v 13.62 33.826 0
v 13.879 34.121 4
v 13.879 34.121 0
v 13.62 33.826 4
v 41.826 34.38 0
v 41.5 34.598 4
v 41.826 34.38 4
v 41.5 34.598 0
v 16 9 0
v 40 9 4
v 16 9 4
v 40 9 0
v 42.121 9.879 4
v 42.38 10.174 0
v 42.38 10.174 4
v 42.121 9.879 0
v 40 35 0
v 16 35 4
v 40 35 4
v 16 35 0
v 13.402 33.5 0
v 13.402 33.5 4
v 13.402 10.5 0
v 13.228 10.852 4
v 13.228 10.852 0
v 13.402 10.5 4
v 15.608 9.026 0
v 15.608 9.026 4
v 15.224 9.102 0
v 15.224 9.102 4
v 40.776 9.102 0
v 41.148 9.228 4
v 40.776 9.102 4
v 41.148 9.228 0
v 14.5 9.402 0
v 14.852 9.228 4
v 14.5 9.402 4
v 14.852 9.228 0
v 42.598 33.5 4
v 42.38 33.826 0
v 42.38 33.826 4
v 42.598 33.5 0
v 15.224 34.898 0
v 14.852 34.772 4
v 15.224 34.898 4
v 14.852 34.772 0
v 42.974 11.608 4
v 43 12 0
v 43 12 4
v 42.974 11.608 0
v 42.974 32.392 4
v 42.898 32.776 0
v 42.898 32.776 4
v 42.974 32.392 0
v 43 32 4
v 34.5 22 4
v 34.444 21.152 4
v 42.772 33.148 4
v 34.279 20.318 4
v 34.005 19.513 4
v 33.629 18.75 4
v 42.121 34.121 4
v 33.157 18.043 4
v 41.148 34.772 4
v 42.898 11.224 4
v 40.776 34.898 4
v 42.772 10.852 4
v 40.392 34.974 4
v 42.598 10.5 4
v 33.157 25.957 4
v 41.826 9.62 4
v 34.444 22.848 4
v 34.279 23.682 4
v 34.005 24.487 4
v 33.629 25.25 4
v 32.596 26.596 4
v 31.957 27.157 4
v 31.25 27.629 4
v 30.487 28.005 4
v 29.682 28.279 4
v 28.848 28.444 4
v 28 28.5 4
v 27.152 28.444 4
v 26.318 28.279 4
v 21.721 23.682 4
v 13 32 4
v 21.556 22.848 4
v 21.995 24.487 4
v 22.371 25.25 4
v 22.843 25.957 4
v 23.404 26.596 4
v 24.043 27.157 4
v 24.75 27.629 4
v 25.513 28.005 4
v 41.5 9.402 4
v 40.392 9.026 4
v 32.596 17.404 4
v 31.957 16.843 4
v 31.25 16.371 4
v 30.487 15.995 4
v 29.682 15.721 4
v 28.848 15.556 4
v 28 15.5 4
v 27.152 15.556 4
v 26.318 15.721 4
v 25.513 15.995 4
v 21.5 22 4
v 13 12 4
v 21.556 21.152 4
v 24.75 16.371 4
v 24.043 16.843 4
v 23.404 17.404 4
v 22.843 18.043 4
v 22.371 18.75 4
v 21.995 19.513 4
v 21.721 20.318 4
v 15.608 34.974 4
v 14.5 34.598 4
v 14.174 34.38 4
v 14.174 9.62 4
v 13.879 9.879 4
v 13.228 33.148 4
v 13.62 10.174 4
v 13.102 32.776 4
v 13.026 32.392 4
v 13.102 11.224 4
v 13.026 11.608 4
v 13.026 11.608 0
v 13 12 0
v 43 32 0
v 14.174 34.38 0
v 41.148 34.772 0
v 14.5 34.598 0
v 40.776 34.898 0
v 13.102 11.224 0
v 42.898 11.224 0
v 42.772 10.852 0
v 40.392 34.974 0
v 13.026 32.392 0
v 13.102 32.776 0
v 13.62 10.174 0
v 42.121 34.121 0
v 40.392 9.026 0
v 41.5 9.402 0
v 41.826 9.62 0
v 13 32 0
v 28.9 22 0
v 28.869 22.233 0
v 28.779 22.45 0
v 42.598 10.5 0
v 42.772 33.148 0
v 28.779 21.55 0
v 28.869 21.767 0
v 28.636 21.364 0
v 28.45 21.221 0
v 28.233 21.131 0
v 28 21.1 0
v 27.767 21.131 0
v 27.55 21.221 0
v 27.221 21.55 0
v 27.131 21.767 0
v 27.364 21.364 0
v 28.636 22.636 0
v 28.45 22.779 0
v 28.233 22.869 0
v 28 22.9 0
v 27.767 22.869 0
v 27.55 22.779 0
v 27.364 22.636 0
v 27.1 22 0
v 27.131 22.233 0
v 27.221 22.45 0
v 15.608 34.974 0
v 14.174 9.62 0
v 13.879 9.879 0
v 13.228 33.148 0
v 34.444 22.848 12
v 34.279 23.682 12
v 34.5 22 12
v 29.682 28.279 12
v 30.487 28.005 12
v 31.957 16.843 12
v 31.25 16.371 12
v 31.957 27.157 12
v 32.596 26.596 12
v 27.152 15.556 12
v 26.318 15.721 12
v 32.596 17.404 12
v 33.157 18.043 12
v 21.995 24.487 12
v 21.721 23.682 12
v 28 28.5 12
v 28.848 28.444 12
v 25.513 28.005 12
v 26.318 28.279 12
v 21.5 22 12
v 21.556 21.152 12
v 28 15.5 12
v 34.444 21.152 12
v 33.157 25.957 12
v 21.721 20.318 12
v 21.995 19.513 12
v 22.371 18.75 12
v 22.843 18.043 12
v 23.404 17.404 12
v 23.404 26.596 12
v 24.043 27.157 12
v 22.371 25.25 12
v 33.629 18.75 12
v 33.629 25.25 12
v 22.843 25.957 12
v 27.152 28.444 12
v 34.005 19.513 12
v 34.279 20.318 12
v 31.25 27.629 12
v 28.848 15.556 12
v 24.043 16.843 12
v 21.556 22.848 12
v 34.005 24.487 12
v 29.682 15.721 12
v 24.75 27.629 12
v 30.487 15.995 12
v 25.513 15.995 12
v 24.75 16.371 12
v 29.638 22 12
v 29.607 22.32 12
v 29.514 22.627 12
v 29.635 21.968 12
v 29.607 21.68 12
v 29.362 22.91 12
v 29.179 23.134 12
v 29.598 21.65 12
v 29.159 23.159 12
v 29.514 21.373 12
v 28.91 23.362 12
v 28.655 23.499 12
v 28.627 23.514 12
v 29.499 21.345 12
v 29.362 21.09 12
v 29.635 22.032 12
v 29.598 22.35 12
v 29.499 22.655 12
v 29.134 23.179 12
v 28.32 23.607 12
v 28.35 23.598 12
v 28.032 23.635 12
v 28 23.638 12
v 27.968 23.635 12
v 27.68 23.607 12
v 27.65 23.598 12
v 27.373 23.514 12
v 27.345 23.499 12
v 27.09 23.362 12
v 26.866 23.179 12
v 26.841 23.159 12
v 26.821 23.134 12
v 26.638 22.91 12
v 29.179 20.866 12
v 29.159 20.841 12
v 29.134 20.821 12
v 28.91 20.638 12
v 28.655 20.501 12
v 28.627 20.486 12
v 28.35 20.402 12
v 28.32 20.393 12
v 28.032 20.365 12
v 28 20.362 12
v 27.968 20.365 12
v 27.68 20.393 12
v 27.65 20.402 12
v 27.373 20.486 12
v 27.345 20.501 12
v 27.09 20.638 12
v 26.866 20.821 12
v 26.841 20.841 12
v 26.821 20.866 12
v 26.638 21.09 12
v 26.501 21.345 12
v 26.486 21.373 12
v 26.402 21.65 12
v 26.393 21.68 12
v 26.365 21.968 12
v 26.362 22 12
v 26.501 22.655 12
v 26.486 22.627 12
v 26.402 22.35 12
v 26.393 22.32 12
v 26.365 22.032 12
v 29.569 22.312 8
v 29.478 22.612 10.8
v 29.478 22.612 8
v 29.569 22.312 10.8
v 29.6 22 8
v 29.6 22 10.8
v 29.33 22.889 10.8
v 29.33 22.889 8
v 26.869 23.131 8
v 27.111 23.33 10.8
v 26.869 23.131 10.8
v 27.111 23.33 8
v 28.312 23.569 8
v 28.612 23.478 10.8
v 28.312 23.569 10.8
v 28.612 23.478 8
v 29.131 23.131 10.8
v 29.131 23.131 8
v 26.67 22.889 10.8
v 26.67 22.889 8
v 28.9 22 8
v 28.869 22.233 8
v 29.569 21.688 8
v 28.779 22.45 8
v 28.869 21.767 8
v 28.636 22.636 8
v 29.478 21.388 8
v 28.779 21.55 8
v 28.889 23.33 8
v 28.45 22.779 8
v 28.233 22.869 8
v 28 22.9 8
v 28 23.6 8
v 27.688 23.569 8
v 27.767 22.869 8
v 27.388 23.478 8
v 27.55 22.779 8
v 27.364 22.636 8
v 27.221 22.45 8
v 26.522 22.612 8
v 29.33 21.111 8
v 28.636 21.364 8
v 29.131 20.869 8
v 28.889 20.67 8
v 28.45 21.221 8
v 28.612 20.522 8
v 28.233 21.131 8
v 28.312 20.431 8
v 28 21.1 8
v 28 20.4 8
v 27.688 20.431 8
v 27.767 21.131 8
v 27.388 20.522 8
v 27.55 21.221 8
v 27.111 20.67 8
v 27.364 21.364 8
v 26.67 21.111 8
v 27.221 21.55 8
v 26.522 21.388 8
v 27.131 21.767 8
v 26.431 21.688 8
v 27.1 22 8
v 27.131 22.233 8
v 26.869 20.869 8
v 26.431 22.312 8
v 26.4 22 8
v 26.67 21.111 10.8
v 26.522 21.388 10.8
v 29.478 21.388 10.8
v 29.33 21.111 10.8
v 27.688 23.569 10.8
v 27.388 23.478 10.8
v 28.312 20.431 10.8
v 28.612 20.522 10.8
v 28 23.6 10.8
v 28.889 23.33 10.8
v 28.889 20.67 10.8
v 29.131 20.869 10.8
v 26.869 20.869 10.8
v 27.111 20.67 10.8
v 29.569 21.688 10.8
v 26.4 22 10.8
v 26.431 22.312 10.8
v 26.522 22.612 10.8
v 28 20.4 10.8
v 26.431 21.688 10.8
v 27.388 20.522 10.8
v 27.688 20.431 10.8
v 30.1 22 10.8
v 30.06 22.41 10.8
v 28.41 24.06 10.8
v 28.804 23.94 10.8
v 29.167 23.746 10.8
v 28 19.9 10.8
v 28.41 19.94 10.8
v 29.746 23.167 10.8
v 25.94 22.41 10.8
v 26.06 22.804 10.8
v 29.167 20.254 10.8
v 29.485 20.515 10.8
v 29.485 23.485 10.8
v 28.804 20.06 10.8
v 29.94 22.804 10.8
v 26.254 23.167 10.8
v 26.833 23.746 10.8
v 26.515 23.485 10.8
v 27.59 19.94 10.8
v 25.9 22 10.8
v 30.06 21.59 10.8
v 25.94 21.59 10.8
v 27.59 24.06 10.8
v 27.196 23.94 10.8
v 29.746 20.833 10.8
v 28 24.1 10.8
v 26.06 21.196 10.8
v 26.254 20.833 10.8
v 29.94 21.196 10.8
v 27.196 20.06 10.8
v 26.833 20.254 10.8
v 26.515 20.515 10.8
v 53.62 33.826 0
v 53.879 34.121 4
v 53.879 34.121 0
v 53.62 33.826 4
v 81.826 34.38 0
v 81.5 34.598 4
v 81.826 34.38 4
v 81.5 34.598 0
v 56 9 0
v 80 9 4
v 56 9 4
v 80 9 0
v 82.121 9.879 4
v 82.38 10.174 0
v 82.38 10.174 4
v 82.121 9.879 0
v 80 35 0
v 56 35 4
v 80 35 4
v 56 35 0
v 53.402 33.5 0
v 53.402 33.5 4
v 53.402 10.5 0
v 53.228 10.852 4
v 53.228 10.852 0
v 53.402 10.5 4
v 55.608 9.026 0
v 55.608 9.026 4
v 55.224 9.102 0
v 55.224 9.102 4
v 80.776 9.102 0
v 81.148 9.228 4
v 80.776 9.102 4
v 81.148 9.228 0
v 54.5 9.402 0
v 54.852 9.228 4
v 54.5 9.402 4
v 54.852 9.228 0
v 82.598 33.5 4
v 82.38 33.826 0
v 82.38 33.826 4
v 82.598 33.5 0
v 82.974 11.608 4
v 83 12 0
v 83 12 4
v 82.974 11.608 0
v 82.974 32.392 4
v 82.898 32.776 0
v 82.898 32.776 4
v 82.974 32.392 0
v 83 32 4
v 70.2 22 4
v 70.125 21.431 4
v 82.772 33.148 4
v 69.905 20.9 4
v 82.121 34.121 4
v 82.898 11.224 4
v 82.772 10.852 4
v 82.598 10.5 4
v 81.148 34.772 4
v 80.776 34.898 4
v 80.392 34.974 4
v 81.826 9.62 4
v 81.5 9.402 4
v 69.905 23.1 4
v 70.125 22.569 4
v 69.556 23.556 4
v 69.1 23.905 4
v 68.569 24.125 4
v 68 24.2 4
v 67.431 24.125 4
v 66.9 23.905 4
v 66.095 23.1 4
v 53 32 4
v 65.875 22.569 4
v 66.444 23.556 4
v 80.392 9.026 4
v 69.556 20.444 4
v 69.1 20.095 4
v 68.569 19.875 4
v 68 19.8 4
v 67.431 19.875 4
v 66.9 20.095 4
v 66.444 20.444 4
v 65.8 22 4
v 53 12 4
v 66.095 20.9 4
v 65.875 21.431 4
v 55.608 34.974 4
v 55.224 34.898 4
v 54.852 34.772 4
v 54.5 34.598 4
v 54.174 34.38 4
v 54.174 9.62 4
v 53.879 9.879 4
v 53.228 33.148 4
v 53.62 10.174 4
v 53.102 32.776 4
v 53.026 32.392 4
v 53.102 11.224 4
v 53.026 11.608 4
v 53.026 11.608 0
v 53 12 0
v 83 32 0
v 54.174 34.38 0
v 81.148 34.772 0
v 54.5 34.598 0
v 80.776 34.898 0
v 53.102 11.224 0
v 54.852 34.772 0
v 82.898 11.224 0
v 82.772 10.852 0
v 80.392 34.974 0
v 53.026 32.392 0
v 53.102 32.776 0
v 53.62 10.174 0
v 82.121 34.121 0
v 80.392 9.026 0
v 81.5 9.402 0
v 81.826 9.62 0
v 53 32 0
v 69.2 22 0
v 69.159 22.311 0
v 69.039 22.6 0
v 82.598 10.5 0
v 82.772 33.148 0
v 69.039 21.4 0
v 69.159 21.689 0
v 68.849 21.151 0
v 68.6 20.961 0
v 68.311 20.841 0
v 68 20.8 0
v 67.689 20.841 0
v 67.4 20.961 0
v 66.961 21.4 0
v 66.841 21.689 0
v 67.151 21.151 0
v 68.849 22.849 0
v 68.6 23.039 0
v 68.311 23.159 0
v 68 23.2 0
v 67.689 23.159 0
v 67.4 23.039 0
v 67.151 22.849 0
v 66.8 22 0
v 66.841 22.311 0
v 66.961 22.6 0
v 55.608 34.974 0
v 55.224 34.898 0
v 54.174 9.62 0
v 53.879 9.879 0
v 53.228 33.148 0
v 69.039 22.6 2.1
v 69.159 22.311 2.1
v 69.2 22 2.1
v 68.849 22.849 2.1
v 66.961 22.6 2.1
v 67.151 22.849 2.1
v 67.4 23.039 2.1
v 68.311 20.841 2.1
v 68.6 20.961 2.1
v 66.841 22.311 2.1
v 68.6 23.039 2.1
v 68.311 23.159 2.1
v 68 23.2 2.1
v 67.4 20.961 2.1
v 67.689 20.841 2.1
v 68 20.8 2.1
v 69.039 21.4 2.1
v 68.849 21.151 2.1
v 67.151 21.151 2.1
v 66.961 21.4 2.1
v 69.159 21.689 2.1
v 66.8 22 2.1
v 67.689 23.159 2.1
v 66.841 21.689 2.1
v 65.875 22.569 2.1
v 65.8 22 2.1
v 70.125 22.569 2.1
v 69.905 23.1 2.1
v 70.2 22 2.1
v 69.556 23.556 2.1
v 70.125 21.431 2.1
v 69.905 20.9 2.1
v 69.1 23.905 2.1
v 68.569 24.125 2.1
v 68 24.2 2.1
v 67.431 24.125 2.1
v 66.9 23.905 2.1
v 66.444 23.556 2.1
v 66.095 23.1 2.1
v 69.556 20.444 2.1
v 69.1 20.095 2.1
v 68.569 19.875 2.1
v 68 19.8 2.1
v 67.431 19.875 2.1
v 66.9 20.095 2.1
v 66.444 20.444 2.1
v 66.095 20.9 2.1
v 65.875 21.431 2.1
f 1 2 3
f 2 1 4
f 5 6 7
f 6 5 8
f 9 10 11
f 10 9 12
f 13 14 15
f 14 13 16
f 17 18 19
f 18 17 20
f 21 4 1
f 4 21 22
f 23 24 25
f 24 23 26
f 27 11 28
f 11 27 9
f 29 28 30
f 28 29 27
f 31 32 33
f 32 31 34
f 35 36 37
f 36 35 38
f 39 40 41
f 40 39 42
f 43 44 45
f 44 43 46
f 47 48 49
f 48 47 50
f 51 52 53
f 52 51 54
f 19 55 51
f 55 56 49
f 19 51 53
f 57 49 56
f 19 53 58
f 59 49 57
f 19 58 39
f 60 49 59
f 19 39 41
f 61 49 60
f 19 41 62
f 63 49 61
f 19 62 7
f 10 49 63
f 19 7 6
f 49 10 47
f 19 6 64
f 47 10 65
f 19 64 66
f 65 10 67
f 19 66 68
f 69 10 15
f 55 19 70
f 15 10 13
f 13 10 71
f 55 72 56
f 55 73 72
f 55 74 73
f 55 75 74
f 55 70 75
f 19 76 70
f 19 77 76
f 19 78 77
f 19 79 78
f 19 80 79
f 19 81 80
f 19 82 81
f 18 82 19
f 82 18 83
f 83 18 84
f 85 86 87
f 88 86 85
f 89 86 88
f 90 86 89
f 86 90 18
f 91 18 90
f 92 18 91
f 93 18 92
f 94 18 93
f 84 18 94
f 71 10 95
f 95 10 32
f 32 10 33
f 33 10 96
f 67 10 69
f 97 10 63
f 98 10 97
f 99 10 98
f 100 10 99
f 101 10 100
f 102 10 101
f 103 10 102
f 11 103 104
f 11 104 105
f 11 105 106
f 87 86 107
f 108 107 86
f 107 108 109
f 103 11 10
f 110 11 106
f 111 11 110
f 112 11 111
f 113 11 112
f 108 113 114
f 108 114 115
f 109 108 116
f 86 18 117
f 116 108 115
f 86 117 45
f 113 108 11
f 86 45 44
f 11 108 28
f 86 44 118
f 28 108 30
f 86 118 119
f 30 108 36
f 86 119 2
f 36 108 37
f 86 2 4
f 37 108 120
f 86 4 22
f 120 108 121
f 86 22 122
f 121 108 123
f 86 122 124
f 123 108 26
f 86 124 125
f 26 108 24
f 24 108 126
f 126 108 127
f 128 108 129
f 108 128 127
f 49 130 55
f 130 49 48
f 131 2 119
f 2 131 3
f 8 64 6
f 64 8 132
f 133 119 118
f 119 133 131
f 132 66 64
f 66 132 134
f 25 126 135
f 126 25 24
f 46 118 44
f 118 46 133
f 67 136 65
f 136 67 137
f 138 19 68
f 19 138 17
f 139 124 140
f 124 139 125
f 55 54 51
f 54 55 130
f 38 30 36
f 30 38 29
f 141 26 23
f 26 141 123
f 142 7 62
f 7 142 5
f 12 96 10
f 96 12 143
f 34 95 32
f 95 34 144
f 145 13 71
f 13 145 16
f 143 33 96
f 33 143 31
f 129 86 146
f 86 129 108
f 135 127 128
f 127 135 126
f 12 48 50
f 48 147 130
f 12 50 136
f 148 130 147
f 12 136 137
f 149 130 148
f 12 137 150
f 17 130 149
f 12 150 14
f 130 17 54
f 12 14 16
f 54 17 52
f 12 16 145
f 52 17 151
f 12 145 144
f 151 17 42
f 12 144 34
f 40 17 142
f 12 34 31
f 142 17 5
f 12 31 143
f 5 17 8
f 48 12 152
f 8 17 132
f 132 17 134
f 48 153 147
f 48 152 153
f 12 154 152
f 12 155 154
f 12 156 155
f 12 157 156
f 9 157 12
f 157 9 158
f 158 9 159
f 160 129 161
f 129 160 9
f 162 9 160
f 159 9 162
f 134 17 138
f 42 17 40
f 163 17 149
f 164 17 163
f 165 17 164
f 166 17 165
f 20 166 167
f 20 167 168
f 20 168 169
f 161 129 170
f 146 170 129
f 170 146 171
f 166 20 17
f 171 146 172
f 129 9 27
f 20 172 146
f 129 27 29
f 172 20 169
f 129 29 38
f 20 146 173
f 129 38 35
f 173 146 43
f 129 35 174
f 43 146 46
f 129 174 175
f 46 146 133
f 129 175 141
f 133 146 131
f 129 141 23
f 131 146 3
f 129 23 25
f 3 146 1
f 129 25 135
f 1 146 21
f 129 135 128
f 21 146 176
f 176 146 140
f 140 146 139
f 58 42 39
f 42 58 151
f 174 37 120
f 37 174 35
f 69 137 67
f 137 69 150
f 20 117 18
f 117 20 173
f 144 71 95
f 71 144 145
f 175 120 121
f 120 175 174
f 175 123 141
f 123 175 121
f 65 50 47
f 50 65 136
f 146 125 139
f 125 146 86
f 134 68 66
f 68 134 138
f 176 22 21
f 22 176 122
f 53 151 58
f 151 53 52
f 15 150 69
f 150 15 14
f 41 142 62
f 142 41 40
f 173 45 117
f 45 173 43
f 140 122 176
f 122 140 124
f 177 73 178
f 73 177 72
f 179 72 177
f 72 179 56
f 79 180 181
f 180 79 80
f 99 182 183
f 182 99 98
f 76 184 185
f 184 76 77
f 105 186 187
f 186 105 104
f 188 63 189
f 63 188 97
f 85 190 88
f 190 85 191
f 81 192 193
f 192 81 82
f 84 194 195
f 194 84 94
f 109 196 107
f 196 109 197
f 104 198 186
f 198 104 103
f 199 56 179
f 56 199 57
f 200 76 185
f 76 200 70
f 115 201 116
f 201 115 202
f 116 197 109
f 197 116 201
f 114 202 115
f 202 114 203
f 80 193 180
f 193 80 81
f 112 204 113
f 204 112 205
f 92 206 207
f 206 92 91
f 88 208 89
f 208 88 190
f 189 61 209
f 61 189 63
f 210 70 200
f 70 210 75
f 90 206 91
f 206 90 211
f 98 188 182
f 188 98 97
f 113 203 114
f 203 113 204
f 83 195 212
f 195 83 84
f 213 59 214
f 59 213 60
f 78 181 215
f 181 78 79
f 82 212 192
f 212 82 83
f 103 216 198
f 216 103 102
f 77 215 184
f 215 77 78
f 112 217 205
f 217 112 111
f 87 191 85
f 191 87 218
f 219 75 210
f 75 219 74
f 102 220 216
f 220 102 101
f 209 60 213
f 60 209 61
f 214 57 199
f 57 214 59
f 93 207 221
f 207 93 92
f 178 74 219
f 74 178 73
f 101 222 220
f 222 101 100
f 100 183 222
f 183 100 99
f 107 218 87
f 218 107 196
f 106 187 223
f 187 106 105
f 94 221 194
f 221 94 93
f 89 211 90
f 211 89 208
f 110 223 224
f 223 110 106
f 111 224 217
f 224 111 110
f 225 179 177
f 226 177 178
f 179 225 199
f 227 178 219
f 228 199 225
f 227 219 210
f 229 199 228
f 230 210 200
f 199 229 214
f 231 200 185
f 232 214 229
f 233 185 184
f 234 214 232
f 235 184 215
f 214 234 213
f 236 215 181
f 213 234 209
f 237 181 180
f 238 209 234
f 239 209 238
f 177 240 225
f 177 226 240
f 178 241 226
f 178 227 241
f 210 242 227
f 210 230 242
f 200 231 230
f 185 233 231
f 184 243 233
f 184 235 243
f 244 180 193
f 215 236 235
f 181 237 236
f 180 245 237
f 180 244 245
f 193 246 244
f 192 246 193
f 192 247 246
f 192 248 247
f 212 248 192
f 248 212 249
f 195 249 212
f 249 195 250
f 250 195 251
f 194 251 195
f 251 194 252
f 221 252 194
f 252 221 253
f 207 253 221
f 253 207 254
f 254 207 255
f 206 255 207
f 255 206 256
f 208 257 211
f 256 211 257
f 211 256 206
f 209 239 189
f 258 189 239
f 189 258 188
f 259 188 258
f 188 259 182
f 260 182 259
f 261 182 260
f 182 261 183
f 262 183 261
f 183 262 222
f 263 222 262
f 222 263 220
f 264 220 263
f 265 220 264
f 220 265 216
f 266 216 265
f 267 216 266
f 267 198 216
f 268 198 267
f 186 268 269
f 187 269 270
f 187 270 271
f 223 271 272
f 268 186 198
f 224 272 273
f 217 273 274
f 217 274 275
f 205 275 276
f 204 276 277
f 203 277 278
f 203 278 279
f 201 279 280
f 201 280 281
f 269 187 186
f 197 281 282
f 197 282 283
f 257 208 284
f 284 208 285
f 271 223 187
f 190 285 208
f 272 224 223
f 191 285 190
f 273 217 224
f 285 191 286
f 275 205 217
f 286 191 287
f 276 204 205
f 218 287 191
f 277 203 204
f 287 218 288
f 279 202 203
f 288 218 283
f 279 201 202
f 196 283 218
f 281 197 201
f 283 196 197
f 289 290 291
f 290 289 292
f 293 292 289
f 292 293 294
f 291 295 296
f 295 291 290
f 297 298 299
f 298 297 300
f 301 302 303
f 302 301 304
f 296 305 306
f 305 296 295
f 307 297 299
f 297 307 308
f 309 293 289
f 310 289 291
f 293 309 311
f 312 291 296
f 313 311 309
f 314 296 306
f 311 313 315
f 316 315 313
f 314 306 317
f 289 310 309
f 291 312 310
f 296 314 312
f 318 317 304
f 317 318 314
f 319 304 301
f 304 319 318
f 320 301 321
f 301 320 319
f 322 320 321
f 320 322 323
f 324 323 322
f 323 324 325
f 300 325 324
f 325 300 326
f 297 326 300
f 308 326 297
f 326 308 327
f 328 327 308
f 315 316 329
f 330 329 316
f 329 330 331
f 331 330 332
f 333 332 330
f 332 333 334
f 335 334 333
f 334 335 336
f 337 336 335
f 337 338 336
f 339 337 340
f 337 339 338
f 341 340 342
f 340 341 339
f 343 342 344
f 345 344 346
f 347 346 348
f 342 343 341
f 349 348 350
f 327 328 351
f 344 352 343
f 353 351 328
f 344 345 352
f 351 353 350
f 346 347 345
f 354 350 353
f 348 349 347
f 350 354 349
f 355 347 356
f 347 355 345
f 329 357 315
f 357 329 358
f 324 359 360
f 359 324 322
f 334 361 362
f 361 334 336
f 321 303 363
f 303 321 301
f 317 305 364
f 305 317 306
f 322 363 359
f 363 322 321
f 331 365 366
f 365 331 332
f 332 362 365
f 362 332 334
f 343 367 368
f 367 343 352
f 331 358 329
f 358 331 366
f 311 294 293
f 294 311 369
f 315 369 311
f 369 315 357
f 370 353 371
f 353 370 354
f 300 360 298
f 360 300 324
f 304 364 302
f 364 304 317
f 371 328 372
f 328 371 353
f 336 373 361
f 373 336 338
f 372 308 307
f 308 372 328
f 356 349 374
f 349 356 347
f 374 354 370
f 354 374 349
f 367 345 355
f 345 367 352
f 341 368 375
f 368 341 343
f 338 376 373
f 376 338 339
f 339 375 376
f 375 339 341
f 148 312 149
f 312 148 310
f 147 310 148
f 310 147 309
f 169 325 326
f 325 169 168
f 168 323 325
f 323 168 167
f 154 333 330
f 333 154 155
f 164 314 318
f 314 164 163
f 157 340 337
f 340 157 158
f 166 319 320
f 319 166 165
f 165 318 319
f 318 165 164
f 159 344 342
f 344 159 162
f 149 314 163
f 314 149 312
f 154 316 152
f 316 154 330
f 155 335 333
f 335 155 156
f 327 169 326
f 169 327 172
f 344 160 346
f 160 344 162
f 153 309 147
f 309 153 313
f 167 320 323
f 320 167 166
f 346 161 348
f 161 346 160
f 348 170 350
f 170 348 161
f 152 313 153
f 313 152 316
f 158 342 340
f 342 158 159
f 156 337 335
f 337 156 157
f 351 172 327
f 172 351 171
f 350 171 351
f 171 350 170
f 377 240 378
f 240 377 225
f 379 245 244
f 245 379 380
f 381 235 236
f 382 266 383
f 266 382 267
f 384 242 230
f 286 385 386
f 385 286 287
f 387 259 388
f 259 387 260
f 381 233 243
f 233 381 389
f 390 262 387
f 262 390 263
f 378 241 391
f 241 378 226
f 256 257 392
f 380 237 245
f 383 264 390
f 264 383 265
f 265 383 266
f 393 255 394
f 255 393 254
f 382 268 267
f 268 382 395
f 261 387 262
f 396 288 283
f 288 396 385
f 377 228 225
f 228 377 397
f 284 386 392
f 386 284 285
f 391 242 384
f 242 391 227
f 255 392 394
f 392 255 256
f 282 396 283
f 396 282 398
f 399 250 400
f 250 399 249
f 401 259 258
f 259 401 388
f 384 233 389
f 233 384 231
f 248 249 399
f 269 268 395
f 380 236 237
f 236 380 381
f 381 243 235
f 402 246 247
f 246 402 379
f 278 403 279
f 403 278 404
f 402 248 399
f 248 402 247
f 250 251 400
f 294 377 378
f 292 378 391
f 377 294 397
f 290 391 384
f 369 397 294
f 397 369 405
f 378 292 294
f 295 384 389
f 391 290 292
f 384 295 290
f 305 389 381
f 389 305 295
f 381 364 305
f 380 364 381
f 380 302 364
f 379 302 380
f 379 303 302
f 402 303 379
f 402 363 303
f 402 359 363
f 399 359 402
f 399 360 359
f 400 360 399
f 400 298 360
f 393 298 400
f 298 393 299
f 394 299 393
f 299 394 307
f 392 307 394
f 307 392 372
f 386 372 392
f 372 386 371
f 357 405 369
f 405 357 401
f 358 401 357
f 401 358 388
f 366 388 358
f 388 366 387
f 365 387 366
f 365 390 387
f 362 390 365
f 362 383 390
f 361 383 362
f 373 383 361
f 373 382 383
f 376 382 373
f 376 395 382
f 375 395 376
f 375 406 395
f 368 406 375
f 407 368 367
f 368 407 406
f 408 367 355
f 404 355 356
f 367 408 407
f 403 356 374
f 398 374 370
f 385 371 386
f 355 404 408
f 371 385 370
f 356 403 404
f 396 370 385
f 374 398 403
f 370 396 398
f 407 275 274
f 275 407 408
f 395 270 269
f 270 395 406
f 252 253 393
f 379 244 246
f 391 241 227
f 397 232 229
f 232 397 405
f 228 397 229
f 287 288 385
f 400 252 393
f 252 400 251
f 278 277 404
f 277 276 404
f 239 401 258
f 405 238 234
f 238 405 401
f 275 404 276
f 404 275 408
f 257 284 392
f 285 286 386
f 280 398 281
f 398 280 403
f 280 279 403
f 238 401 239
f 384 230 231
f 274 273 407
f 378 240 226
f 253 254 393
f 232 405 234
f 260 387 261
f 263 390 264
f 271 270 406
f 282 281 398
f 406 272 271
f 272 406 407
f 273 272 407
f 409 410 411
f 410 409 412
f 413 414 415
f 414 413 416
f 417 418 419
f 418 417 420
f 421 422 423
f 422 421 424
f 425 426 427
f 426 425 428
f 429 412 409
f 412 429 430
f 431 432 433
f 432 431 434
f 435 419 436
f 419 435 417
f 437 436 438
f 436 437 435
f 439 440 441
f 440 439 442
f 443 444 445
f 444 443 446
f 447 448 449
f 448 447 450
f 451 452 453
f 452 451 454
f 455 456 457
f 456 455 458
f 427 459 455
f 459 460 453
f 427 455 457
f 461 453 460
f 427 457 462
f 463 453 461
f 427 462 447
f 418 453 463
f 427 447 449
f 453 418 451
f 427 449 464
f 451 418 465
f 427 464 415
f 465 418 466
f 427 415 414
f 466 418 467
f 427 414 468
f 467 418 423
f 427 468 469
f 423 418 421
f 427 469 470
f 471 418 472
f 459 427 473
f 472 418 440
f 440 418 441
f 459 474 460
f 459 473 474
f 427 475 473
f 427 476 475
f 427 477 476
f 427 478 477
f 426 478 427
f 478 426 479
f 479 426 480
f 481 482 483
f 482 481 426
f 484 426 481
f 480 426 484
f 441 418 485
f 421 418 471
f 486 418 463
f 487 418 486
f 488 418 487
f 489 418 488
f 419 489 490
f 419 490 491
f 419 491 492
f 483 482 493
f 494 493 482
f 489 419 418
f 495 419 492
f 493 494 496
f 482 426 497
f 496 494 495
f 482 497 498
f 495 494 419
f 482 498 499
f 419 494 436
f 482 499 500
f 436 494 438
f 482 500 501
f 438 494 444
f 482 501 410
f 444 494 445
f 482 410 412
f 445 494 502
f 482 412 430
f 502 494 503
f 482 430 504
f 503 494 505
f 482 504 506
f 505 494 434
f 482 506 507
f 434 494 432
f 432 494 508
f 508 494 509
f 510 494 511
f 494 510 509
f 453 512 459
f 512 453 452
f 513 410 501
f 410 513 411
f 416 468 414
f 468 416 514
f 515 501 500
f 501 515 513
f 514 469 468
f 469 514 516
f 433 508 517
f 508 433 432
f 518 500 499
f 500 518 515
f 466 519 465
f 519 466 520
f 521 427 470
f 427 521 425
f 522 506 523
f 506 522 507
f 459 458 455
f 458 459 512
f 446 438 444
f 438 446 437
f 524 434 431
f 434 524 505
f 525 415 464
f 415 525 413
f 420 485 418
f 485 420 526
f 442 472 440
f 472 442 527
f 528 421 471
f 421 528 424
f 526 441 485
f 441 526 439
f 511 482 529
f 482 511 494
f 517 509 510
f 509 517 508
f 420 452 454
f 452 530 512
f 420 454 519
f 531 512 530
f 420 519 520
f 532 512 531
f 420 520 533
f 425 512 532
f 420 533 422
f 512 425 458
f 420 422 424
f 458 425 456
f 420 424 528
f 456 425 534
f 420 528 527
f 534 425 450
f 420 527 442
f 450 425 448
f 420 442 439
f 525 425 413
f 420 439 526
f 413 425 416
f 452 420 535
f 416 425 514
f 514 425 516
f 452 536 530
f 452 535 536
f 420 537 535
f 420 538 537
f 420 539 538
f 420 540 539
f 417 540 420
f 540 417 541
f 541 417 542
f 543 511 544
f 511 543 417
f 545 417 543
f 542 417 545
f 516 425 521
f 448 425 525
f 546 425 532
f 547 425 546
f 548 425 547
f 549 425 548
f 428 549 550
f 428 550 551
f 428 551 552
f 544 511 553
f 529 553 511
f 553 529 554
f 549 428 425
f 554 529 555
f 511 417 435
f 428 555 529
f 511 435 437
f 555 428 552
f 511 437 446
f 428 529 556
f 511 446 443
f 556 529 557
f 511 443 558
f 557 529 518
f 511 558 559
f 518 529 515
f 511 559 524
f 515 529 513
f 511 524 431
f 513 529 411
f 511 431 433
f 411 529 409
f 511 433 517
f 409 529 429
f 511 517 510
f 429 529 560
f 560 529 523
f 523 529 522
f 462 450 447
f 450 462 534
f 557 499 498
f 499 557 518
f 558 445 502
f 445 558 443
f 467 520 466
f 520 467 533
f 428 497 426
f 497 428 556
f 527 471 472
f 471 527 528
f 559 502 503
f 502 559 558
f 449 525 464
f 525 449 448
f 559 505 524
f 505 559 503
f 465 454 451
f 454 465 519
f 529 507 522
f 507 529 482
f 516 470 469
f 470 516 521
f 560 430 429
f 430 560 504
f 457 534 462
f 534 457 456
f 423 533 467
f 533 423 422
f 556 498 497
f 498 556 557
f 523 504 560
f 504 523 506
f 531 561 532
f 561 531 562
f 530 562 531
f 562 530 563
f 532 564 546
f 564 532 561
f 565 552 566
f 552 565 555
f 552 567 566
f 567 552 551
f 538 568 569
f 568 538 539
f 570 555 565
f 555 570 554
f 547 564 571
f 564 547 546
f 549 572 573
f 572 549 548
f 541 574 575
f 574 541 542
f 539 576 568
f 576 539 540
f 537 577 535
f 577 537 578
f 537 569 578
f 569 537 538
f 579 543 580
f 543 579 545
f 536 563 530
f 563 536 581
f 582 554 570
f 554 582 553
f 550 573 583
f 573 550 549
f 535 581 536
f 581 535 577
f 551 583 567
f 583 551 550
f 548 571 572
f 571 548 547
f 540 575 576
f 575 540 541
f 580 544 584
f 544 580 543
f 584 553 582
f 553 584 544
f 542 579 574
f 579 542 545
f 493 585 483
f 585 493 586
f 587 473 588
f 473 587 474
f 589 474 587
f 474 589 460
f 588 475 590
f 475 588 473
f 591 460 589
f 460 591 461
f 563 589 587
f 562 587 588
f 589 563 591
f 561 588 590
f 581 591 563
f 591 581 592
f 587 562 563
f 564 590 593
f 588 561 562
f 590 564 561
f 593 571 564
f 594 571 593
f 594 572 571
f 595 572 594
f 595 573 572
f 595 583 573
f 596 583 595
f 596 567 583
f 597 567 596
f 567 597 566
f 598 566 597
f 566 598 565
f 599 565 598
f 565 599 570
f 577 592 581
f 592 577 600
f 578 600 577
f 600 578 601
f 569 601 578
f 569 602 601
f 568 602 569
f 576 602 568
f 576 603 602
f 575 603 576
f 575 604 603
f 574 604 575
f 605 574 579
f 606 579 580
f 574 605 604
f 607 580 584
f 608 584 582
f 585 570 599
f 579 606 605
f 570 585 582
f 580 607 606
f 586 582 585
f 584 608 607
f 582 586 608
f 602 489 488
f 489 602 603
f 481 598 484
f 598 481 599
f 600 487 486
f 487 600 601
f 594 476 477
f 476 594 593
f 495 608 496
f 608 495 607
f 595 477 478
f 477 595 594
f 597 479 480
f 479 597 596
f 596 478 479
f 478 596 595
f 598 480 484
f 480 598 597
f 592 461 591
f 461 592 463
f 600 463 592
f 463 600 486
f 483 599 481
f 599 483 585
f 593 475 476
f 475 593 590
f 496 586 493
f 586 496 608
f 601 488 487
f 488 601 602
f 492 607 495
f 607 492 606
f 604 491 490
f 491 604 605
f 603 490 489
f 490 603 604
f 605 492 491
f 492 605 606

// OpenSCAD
/*
Sample 061: Heizeinsatz-Schraubprobe — M2
Generated from the FDM Mechanical Sample Library.
Units: millimetres.

Override examples:
  openscad -o custom.stl -D 'view="plate"' -D 'render_fn=64' model.scad
  openscad -o preview.png -D 'view="assembly"' model.scad
*/
use <../../../library/fdm_mechanisms.scad>

render_fn = is_undef(render_fn) ? 48 : render_fn;
view = is_undef(view) ? "plate" : view;
$fn = render_fn;

sample_heatset_insert(
    view=view,
    pilot_d=3.2,
    screw_clear=2.4,
    head_d=4.4,
    insert_depth=4
);
